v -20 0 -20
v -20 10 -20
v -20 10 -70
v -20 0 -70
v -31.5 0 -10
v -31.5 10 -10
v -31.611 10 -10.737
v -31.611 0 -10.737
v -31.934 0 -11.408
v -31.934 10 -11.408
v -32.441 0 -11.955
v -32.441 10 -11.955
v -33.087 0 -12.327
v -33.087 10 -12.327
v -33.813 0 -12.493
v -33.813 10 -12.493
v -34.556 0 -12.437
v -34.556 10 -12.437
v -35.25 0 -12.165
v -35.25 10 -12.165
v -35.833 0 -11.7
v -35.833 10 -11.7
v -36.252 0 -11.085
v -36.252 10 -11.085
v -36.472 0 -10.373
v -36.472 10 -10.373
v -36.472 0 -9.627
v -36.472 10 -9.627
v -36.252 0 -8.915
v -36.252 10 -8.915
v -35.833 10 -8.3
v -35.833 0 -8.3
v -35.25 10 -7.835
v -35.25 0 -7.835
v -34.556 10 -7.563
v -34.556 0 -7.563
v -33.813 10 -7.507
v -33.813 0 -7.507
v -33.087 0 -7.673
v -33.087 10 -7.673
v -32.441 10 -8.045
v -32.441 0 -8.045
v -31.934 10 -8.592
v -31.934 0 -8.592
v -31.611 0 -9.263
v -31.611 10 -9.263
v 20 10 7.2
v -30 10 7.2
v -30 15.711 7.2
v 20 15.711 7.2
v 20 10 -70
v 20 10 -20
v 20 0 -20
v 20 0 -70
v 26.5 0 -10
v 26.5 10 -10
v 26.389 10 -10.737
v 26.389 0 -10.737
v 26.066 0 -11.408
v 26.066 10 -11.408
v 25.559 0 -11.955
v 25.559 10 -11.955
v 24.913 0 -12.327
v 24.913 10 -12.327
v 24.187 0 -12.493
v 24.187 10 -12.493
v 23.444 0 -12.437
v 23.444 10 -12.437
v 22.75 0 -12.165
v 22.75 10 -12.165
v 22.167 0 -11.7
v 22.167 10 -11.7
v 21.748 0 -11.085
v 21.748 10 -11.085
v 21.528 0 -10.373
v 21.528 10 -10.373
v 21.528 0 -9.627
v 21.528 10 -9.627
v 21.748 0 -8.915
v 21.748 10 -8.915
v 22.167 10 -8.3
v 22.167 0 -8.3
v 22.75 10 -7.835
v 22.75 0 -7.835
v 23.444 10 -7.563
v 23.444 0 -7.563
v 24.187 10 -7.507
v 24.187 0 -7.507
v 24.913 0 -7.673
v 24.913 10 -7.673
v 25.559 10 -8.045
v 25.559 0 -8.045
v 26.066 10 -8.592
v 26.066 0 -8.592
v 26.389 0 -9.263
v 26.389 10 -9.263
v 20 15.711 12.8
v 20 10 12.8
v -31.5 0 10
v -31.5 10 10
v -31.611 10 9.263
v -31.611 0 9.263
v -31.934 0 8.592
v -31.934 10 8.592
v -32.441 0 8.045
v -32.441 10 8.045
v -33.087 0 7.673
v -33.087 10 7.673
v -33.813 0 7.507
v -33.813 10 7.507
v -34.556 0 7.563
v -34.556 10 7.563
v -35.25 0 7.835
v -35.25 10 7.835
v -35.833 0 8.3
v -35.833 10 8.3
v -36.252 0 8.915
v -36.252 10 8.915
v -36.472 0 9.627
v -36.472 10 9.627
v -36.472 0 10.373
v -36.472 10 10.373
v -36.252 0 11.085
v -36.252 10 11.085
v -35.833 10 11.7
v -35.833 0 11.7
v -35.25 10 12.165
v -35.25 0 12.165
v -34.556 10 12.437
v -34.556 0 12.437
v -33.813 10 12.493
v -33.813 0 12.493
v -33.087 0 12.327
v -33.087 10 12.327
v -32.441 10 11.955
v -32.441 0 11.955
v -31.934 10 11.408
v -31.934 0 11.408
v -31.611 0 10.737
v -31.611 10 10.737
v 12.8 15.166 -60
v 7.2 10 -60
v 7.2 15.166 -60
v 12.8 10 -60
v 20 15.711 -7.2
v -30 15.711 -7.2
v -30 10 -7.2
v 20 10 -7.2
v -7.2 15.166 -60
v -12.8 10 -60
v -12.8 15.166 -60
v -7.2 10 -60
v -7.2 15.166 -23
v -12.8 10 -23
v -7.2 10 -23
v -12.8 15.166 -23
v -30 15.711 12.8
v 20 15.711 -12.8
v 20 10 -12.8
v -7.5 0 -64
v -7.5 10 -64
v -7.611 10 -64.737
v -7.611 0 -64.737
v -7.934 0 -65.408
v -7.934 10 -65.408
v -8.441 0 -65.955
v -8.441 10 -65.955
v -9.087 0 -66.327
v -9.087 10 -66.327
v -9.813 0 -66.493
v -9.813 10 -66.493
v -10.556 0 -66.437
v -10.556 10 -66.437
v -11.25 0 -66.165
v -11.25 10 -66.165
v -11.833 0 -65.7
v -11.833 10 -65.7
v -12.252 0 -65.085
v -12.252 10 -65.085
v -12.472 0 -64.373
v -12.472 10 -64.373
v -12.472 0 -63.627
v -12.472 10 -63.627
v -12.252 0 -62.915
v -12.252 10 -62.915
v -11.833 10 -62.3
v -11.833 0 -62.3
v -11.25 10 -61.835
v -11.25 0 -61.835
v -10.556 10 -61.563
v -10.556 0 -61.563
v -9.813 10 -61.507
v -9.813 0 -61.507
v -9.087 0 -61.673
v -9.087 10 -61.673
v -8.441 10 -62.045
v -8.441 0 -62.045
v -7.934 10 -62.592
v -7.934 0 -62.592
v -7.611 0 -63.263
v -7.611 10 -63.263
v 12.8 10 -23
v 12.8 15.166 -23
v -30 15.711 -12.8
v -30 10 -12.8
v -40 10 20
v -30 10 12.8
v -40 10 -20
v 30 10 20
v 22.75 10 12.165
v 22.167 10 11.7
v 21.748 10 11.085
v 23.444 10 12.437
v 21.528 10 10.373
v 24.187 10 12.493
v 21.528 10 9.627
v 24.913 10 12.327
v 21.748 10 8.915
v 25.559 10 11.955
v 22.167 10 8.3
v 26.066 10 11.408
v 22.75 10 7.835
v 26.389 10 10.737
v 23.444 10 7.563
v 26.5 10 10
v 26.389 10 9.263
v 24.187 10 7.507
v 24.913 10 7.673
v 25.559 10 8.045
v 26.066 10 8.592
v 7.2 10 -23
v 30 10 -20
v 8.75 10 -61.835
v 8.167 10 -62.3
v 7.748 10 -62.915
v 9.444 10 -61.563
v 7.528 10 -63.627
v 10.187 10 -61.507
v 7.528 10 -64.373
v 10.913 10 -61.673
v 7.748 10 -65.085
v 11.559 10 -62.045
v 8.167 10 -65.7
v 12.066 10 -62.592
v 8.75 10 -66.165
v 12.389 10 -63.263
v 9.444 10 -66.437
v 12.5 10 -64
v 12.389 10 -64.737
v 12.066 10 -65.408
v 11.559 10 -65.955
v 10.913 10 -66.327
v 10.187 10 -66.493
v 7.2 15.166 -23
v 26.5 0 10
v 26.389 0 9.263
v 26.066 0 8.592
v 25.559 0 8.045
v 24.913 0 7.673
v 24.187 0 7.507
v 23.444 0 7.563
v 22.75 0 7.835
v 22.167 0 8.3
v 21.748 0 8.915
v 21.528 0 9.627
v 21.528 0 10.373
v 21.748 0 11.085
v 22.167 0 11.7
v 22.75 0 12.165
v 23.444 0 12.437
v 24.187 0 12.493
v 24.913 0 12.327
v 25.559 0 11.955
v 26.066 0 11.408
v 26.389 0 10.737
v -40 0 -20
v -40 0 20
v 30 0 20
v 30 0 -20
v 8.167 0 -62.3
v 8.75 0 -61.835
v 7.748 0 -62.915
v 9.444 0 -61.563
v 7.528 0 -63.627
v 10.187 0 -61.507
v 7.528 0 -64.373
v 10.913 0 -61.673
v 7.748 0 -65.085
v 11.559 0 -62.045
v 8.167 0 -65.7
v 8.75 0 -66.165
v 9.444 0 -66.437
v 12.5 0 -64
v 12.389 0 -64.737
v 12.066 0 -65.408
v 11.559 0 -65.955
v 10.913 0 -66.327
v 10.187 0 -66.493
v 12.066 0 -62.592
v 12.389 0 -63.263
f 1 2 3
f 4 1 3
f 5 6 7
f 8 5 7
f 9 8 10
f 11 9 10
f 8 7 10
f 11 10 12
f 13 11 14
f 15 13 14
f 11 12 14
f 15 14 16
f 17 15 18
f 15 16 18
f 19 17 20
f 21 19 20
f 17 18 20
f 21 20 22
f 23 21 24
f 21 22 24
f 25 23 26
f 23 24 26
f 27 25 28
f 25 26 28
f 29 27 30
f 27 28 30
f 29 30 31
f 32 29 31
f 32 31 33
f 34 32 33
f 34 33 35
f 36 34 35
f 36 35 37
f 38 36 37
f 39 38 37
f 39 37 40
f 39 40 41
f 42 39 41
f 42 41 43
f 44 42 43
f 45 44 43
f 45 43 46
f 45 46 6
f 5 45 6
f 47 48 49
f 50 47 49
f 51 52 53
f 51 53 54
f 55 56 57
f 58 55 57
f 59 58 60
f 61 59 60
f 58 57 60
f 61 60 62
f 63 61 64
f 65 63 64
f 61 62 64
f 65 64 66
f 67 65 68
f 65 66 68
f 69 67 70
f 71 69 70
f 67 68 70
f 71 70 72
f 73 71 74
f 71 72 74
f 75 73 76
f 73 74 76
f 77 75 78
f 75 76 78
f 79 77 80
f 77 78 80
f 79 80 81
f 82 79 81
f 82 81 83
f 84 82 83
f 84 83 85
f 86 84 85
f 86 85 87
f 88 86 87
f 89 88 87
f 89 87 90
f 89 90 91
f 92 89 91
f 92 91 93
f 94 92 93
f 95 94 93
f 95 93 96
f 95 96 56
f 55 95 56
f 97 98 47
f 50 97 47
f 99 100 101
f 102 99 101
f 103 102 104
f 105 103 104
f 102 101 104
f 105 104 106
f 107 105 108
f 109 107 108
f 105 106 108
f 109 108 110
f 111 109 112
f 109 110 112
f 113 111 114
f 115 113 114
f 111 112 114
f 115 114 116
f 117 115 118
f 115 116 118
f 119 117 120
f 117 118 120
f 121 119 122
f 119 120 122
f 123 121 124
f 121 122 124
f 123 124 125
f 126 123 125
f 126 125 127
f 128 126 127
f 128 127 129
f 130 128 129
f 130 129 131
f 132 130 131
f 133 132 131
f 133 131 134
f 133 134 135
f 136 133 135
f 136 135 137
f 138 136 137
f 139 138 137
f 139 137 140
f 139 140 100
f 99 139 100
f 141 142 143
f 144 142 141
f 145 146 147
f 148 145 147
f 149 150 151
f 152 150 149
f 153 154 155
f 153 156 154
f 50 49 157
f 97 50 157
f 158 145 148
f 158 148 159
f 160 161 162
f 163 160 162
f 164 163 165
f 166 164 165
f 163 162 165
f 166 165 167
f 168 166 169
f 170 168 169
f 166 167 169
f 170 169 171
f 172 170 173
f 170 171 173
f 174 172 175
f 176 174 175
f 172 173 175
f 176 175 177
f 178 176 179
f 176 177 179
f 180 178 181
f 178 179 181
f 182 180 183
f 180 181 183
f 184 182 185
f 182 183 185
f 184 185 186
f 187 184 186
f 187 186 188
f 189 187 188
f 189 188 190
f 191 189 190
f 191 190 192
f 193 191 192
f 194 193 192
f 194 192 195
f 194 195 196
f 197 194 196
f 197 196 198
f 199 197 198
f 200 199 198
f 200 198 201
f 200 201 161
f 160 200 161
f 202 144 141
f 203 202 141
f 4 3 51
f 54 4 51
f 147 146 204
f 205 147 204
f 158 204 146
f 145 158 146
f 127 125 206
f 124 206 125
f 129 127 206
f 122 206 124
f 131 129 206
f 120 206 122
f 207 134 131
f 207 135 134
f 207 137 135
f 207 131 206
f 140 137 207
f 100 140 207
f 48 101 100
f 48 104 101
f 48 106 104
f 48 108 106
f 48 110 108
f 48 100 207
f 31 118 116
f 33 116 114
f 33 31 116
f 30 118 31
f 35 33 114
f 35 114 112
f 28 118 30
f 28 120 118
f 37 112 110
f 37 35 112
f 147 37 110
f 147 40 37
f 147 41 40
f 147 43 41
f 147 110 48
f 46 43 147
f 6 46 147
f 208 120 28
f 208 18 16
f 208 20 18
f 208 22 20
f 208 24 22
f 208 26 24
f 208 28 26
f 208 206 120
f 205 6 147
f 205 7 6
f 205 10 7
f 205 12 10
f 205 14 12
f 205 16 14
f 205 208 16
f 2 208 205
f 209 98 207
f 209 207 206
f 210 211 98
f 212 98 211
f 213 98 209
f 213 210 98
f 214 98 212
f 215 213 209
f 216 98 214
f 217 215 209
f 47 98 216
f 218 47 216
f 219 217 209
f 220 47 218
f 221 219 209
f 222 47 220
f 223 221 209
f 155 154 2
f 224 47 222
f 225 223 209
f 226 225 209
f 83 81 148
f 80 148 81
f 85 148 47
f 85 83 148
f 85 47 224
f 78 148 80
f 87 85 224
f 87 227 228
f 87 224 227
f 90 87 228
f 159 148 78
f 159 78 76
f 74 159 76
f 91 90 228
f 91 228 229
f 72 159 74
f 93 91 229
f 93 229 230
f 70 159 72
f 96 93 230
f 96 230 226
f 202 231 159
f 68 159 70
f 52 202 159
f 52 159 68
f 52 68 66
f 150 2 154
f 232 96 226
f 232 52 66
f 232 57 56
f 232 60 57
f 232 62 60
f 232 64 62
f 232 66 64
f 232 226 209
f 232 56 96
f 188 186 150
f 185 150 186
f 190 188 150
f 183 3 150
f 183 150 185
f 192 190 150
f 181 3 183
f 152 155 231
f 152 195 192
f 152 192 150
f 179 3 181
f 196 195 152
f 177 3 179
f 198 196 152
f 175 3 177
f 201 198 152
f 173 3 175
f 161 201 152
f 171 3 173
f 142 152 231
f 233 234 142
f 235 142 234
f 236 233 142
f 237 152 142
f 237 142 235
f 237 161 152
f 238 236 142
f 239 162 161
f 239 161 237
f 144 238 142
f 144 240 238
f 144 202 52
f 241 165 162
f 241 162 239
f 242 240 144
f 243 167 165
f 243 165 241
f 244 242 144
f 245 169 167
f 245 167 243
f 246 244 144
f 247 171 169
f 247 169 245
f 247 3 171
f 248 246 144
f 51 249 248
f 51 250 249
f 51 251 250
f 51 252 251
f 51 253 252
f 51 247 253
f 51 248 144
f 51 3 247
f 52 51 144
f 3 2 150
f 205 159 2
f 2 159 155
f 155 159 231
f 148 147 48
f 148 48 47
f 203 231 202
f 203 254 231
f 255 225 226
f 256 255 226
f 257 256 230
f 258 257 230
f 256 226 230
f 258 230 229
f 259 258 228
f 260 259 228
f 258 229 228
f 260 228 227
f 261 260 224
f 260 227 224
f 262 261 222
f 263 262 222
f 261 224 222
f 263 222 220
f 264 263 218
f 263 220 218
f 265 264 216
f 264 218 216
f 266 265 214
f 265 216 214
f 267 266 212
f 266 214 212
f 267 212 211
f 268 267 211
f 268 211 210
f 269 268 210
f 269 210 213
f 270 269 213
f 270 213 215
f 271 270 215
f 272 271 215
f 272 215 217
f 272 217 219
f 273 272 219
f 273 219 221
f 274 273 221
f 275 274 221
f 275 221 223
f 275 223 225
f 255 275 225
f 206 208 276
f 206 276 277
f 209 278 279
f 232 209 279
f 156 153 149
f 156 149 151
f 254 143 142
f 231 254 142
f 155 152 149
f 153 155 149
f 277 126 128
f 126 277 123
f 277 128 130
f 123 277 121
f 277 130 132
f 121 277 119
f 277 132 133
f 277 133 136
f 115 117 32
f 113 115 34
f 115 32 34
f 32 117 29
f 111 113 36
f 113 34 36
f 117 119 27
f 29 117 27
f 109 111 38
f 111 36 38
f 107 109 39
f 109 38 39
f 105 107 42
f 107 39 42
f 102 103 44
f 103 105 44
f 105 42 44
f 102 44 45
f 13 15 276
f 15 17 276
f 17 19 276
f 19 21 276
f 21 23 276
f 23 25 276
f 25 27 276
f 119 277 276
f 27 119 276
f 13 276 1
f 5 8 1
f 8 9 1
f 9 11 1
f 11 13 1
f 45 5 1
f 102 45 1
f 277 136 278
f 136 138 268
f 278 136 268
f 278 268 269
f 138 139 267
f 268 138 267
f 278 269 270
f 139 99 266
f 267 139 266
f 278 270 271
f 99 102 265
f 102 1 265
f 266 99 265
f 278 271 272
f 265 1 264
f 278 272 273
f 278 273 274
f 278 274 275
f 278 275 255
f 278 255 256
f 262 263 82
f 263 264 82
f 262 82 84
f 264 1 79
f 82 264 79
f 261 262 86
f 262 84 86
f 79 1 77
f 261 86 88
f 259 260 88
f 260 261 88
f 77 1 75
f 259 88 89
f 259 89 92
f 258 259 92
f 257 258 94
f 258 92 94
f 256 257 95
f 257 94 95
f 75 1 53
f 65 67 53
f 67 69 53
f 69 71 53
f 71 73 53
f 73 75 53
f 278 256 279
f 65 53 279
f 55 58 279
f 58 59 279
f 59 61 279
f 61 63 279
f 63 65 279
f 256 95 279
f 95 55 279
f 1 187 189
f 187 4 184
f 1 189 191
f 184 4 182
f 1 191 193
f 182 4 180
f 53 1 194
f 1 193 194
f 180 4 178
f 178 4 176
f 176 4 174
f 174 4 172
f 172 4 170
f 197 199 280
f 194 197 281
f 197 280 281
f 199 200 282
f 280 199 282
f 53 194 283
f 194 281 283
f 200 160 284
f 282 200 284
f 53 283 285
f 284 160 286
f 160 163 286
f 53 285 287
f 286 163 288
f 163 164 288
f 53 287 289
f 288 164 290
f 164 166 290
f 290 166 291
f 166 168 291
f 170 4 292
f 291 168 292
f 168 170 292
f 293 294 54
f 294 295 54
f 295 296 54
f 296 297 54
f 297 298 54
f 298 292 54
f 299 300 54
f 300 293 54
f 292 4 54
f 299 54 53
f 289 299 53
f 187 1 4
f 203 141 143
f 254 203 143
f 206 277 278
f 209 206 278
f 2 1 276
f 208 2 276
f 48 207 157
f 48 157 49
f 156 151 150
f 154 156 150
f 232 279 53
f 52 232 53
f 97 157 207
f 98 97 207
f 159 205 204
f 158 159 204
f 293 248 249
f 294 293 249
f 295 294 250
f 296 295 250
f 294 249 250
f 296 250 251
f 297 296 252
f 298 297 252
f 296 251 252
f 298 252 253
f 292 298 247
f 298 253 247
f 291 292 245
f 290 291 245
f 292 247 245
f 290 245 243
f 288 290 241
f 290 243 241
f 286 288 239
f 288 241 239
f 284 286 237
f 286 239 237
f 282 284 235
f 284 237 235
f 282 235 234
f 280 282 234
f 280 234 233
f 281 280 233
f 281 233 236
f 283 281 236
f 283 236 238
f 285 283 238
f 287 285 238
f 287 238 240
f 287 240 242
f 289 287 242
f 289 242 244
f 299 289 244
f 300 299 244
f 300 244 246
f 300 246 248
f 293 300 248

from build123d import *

# Parameters (mm, degrees)
SALIENTE_EXTRUIR1_DEPTH = 10
SALIENTE_EXTRUIR3_DEPTH = 100
CROQUIS5_W              = 40
CROQUIS5_H              = 50
SALIENTE_EXTRUIR5_DEPTH = 10
SALIENTE_EXTRUIR7_DEPTH = 47
CROQUIS11_W             = 74.096638428
CROQUIS11_H             = 162.244793696
CORTAR_EXTRUIR3_DEPTH   = 30
CROQUIS9_W              = 10
CROQUIS9_H              = 40
CROQUIS9_W_2            = 40
CROQUIS9_H_2            = 10
CORTAR_EXTRUIR1_DEPTH   = 6.711119453
CROQUIS12_R             = 2.5
CORTAR_EXTRUIR4_DEPTH   = 11


with BuildPart() as part:
    # Croquis1 → Saliente-Extruir1 (new body)
    with BuildSketch(Plane(origin=(0, 0, 0), x_dir=(1, 0, 0), z_dir=(0, 1, 0))):
        Polygon((30, 20), (-30, 20), (-70, 20), (-70, -20), (-30, -20), (30, -20), align=None)
    extrude(amount=SALIENTE_EXTRUIR1_DEPTH)

    # Croquis3 → Saliente-Extruir3 (add, through all)
    with BuildSketch(Plane.ZY.offset(70)):
        Polygon((10, 10), (7.2, 10), (7.2, 15.711119453), (12.8, 15.711119453), (12.8, 10), align=None)
        Polygon((-10, 10), (-12.8, 10), (-12.8, 15.711119453), (-7.2, 15.711119453), (-7.2, 10), align=None)
    extrude(amount=-SALIENTE_EXTRUIR3_DEPTH)

    # Croquis5 → Saliente-Extruir5 (add)
    with BuildSketch(Plane(origin=(0, 10, 0), x_dir=(1, 0, 0), z_dir=(0, 1, 0))):
        with Locations((0, 45)):
            Rectangle(CROQUIS5_W, CROQUIS5_H)
    extrude(amount=-SALIENTE_EXTRUIR5_DEPTH)

    # Croquis7 → Saliente-Extruir7 (add)
    with BuildSketch(Plane(origin=(0, 0, -70), x_dir=(-1, 0, 0), z_dir=(0, 0, -1))):
        Polygon((12.8, 10), (10, 10), (7.2, 10), (7.2, 15.165648874), (12.8, 15.165648874), align=None)
        Polygon((-7.2, 10), (-10, 10), (-12.8, 10), (-12.8, 15.165648874), (-7.2, 15.165648874), align=None)
    extrude(amount=-SALIENTE_EXTRUIR7_DEPTH)

    # Croquis11 → Cortar-Extruir3 (cut)
    with BuildSketch(Plane.ZY.offset(70)):
        Rectangle(CROQUIS11_W, CROQUIS11_H)
    extrude(amount=-CORTAR_EXTRUIR3_DEPTH, mode=Mode.SUBTRACT)

    # Croquis9 → Cortar-Extruir1 (cut, through all)
    with BuildSketch(Plane(origin=(0, 10, 0), x_dir=(1, 0, 0), z_dir=(0, 1, 0))):
        with Locations((25, 0)):
            Rectangle(CROQUIS9_W, CROQUIS9_H)
        with Locations((0, 65)):
            Rectangle(CROQUIS9_W_2, CROQUIS9_H_2)
        with Locations((-35, 0)):
            Rectangle(CROQUIS9_W, CROQUIS9_H)
    extrude(amount=CORTAR_EXTRUIR1_DEPTH, mode=Mode.SUBTRACT)

    # Croquis12 → Cortar-Extruir4 (cut, through all)
    with BuildSketch(Plane(origin=(0, 10, 0), x_dir=(1, 0, 0), z_dir=(0, 1, 0))):
        with Locations((24, -10)):
            Circle(CROQUIS12_R)
        with Locations((24, 10)):
            Circle(CROQUIS12_R)
        with Locations((-34, -10)):
            Circle(CROQUIS12_R)
        with Locations((-34, 10)):
            Circle(CROQUIS12_R)
        with Locations((10, 64)):
            Circle(CROQUIS12_R)
        with Locations((-10, 64)):
            Circle(CROQUIS12_R)
    extrude(amount=-CORTAR_EXTRUIR4_DEPTH, mode=Mode.SUBTRACT)


solid = part.part
